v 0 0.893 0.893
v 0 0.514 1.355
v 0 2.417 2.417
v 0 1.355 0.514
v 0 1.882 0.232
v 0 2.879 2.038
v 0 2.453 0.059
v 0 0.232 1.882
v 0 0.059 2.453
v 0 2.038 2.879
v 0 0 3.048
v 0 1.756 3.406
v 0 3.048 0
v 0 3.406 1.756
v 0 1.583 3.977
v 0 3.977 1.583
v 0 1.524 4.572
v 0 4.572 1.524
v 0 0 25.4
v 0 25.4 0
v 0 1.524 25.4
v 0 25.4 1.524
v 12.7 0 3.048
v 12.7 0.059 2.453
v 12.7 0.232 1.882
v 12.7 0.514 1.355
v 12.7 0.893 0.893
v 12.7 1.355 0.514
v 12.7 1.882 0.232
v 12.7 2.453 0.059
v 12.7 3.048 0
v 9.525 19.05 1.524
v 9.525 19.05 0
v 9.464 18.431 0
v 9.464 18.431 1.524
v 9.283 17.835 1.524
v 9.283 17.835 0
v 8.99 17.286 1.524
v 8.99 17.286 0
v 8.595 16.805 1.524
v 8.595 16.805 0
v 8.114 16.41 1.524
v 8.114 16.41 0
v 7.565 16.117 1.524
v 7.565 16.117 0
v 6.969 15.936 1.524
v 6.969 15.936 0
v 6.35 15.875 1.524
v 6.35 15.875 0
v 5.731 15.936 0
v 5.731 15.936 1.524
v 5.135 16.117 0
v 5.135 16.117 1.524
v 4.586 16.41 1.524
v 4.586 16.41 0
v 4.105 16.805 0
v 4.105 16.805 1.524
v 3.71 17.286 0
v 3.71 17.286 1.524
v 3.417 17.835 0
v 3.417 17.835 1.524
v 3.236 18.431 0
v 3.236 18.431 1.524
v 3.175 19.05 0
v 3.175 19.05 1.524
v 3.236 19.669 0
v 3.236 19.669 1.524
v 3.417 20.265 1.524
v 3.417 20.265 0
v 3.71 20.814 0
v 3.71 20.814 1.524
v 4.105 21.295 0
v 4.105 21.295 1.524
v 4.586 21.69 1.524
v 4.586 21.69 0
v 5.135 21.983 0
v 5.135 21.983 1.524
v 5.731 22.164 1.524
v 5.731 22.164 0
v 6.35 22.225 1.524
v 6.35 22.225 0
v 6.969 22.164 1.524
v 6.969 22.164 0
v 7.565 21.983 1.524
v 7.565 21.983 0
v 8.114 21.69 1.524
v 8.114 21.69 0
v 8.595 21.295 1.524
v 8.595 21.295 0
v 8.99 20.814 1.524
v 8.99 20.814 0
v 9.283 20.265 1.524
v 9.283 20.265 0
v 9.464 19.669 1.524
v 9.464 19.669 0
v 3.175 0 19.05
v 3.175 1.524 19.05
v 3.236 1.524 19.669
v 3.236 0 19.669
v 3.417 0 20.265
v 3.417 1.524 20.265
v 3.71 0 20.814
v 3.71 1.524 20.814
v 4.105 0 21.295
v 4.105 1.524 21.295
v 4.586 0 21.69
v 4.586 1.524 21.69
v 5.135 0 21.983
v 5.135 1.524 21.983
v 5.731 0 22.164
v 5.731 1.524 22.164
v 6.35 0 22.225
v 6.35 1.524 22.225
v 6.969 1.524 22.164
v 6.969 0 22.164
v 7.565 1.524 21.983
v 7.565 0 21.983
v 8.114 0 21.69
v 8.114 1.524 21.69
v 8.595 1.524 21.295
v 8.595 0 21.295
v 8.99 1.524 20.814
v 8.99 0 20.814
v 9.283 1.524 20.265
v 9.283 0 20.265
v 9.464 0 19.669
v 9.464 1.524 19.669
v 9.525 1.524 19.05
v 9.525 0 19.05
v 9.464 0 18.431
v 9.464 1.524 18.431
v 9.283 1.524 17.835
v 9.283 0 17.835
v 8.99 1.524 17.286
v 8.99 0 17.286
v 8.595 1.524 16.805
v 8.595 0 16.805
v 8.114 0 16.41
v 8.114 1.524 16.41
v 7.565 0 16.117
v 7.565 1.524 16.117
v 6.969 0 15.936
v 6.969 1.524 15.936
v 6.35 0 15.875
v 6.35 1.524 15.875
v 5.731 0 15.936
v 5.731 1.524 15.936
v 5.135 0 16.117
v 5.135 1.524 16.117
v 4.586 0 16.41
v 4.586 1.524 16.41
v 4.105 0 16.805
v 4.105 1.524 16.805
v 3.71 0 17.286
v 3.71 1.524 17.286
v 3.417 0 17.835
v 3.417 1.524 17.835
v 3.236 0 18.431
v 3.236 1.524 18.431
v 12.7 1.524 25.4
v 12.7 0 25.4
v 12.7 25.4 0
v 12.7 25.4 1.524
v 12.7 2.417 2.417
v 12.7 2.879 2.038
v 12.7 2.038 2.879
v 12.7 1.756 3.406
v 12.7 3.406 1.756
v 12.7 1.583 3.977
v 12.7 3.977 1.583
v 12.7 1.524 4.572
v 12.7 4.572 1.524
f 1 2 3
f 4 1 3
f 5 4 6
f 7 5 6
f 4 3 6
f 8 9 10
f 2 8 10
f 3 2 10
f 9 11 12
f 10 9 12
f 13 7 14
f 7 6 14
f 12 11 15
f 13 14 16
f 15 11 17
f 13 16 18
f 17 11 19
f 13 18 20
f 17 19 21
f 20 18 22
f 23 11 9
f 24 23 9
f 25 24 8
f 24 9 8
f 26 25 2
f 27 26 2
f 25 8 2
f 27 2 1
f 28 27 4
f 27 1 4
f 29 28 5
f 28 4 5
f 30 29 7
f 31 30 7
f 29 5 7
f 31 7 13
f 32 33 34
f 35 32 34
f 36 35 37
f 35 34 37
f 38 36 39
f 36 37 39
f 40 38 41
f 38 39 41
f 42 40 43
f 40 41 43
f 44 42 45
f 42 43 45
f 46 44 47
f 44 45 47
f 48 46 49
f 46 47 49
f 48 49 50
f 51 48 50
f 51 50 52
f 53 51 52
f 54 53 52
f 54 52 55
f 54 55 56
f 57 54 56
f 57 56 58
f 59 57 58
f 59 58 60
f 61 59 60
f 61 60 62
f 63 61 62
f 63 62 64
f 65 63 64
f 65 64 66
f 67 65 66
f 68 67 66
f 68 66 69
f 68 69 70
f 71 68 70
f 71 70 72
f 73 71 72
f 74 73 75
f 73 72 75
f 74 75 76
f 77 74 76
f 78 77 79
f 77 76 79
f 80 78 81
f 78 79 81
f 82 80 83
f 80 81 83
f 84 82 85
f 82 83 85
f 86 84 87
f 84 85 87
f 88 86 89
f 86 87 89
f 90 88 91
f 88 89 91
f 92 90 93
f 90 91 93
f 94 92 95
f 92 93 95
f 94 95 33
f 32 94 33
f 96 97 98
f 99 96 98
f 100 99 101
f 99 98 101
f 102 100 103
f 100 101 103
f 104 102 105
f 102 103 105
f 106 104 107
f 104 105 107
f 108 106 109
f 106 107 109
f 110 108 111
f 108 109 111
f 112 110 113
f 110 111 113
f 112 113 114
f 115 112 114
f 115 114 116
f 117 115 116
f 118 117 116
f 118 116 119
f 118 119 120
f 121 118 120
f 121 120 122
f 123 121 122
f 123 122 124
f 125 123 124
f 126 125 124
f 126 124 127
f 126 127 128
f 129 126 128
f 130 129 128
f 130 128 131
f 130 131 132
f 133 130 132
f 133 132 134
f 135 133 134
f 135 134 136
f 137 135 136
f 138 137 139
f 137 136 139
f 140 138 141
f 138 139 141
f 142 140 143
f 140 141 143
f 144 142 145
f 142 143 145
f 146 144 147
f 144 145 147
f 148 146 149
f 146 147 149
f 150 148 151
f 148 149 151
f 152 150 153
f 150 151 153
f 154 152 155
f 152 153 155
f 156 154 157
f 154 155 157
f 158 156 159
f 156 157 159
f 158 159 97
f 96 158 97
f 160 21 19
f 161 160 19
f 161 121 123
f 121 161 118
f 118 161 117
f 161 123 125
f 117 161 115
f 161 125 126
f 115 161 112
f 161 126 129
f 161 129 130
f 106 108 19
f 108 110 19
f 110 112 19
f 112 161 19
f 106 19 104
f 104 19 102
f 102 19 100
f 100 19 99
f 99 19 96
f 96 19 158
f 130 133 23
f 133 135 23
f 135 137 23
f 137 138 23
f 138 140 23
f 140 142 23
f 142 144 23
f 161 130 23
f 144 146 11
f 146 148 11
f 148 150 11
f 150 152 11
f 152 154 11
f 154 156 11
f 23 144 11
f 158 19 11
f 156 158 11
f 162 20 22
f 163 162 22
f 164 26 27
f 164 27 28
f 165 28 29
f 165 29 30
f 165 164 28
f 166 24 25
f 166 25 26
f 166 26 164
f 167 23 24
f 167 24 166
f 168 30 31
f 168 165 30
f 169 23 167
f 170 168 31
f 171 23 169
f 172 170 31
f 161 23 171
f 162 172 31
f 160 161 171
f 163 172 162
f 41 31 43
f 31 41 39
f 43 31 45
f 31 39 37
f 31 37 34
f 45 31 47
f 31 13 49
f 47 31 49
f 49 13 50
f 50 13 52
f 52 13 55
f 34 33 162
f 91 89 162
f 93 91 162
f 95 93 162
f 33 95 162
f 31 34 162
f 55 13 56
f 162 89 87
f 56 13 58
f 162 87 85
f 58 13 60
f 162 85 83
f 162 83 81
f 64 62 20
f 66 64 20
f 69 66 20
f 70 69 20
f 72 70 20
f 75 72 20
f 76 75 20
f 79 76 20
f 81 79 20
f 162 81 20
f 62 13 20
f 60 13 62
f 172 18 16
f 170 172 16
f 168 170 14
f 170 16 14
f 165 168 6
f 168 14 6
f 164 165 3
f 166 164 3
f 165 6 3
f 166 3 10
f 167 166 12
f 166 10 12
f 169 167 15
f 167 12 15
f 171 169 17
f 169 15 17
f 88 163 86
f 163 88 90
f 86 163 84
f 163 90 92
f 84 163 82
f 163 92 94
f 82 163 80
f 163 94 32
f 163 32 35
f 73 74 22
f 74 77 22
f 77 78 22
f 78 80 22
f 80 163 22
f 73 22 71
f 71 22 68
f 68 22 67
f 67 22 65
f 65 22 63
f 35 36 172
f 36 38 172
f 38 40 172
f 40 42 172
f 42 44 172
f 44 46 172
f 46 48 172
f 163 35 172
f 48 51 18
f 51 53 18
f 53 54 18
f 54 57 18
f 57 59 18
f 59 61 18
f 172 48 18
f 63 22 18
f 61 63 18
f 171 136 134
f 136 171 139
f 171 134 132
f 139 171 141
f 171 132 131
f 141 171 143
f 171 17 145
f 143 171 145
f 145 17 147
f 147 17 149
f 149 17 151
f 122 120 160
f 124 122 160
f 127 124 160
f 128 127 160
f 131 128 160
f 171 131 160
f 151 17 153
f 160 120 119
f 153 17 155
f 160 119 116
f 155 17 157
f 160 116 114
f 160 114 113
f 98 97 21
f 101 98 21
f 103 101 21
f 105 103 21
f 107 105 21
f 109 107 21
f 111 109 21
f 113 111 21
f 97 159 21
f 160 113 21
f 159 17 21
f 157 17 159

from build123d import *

# Parameters (mm, degrees)
F1_DEPTH = 12.7
F2_R     = 3.175
F3_DEPTH = 25.4
F4_R     = 3.175
F5_DEPTH = 25.4


with BuildPart() as f1:
    # F0 (on Right) → F1 (new body)
    with BuildSketch(Plane.YZ):
        with BuildLine():
            Line((0, 25.4), (0, 3.048))
            ThreePointArc((0, 3.048), (0.892739, 0.892739), (3.048, 0))
            Line((3.048, 0), (25.4, 0))
            Line((25.4, 0), (25.4, 1.524))
            Line((25.4, 1.524), (4.572, 1.524))
            ThreePointArc((4.572, 1.524), (2.416739, 2.416739), (1.524, 4.572))
            Line((1.524, 4.572), (1.524, 25.4))
            Line((1.524, 25.4), (0, 25.4))
        make_face()
    extrude(amount=F1_DEPTH)

    # F2 (on face) → F3 (cut)
    with BuildSketch(Plane(origin=(0, 1.524, 0), x_dir=(-1, 0, 0), z_dir=(0, 1, 0))):
        with Locations((-6.35, 19.05)):
            Circle(F2_R)
    extrude(amount=-F3_DEPTH, mode=Mode.SUBTRACT)

    # F4 (on face) → F5 (cut)
    with BuildSketch(Plane(origin=(0, 0, 0), x_dir=(1, 0, 0), z_dir=(0, 0, -1))):
        with Locations((6.35, -19.05)):
            Circle(F4_R)
    extrude(amount=-F5_DEPTH, mode=Mode.SUBTRACT)


solid = f1.part
